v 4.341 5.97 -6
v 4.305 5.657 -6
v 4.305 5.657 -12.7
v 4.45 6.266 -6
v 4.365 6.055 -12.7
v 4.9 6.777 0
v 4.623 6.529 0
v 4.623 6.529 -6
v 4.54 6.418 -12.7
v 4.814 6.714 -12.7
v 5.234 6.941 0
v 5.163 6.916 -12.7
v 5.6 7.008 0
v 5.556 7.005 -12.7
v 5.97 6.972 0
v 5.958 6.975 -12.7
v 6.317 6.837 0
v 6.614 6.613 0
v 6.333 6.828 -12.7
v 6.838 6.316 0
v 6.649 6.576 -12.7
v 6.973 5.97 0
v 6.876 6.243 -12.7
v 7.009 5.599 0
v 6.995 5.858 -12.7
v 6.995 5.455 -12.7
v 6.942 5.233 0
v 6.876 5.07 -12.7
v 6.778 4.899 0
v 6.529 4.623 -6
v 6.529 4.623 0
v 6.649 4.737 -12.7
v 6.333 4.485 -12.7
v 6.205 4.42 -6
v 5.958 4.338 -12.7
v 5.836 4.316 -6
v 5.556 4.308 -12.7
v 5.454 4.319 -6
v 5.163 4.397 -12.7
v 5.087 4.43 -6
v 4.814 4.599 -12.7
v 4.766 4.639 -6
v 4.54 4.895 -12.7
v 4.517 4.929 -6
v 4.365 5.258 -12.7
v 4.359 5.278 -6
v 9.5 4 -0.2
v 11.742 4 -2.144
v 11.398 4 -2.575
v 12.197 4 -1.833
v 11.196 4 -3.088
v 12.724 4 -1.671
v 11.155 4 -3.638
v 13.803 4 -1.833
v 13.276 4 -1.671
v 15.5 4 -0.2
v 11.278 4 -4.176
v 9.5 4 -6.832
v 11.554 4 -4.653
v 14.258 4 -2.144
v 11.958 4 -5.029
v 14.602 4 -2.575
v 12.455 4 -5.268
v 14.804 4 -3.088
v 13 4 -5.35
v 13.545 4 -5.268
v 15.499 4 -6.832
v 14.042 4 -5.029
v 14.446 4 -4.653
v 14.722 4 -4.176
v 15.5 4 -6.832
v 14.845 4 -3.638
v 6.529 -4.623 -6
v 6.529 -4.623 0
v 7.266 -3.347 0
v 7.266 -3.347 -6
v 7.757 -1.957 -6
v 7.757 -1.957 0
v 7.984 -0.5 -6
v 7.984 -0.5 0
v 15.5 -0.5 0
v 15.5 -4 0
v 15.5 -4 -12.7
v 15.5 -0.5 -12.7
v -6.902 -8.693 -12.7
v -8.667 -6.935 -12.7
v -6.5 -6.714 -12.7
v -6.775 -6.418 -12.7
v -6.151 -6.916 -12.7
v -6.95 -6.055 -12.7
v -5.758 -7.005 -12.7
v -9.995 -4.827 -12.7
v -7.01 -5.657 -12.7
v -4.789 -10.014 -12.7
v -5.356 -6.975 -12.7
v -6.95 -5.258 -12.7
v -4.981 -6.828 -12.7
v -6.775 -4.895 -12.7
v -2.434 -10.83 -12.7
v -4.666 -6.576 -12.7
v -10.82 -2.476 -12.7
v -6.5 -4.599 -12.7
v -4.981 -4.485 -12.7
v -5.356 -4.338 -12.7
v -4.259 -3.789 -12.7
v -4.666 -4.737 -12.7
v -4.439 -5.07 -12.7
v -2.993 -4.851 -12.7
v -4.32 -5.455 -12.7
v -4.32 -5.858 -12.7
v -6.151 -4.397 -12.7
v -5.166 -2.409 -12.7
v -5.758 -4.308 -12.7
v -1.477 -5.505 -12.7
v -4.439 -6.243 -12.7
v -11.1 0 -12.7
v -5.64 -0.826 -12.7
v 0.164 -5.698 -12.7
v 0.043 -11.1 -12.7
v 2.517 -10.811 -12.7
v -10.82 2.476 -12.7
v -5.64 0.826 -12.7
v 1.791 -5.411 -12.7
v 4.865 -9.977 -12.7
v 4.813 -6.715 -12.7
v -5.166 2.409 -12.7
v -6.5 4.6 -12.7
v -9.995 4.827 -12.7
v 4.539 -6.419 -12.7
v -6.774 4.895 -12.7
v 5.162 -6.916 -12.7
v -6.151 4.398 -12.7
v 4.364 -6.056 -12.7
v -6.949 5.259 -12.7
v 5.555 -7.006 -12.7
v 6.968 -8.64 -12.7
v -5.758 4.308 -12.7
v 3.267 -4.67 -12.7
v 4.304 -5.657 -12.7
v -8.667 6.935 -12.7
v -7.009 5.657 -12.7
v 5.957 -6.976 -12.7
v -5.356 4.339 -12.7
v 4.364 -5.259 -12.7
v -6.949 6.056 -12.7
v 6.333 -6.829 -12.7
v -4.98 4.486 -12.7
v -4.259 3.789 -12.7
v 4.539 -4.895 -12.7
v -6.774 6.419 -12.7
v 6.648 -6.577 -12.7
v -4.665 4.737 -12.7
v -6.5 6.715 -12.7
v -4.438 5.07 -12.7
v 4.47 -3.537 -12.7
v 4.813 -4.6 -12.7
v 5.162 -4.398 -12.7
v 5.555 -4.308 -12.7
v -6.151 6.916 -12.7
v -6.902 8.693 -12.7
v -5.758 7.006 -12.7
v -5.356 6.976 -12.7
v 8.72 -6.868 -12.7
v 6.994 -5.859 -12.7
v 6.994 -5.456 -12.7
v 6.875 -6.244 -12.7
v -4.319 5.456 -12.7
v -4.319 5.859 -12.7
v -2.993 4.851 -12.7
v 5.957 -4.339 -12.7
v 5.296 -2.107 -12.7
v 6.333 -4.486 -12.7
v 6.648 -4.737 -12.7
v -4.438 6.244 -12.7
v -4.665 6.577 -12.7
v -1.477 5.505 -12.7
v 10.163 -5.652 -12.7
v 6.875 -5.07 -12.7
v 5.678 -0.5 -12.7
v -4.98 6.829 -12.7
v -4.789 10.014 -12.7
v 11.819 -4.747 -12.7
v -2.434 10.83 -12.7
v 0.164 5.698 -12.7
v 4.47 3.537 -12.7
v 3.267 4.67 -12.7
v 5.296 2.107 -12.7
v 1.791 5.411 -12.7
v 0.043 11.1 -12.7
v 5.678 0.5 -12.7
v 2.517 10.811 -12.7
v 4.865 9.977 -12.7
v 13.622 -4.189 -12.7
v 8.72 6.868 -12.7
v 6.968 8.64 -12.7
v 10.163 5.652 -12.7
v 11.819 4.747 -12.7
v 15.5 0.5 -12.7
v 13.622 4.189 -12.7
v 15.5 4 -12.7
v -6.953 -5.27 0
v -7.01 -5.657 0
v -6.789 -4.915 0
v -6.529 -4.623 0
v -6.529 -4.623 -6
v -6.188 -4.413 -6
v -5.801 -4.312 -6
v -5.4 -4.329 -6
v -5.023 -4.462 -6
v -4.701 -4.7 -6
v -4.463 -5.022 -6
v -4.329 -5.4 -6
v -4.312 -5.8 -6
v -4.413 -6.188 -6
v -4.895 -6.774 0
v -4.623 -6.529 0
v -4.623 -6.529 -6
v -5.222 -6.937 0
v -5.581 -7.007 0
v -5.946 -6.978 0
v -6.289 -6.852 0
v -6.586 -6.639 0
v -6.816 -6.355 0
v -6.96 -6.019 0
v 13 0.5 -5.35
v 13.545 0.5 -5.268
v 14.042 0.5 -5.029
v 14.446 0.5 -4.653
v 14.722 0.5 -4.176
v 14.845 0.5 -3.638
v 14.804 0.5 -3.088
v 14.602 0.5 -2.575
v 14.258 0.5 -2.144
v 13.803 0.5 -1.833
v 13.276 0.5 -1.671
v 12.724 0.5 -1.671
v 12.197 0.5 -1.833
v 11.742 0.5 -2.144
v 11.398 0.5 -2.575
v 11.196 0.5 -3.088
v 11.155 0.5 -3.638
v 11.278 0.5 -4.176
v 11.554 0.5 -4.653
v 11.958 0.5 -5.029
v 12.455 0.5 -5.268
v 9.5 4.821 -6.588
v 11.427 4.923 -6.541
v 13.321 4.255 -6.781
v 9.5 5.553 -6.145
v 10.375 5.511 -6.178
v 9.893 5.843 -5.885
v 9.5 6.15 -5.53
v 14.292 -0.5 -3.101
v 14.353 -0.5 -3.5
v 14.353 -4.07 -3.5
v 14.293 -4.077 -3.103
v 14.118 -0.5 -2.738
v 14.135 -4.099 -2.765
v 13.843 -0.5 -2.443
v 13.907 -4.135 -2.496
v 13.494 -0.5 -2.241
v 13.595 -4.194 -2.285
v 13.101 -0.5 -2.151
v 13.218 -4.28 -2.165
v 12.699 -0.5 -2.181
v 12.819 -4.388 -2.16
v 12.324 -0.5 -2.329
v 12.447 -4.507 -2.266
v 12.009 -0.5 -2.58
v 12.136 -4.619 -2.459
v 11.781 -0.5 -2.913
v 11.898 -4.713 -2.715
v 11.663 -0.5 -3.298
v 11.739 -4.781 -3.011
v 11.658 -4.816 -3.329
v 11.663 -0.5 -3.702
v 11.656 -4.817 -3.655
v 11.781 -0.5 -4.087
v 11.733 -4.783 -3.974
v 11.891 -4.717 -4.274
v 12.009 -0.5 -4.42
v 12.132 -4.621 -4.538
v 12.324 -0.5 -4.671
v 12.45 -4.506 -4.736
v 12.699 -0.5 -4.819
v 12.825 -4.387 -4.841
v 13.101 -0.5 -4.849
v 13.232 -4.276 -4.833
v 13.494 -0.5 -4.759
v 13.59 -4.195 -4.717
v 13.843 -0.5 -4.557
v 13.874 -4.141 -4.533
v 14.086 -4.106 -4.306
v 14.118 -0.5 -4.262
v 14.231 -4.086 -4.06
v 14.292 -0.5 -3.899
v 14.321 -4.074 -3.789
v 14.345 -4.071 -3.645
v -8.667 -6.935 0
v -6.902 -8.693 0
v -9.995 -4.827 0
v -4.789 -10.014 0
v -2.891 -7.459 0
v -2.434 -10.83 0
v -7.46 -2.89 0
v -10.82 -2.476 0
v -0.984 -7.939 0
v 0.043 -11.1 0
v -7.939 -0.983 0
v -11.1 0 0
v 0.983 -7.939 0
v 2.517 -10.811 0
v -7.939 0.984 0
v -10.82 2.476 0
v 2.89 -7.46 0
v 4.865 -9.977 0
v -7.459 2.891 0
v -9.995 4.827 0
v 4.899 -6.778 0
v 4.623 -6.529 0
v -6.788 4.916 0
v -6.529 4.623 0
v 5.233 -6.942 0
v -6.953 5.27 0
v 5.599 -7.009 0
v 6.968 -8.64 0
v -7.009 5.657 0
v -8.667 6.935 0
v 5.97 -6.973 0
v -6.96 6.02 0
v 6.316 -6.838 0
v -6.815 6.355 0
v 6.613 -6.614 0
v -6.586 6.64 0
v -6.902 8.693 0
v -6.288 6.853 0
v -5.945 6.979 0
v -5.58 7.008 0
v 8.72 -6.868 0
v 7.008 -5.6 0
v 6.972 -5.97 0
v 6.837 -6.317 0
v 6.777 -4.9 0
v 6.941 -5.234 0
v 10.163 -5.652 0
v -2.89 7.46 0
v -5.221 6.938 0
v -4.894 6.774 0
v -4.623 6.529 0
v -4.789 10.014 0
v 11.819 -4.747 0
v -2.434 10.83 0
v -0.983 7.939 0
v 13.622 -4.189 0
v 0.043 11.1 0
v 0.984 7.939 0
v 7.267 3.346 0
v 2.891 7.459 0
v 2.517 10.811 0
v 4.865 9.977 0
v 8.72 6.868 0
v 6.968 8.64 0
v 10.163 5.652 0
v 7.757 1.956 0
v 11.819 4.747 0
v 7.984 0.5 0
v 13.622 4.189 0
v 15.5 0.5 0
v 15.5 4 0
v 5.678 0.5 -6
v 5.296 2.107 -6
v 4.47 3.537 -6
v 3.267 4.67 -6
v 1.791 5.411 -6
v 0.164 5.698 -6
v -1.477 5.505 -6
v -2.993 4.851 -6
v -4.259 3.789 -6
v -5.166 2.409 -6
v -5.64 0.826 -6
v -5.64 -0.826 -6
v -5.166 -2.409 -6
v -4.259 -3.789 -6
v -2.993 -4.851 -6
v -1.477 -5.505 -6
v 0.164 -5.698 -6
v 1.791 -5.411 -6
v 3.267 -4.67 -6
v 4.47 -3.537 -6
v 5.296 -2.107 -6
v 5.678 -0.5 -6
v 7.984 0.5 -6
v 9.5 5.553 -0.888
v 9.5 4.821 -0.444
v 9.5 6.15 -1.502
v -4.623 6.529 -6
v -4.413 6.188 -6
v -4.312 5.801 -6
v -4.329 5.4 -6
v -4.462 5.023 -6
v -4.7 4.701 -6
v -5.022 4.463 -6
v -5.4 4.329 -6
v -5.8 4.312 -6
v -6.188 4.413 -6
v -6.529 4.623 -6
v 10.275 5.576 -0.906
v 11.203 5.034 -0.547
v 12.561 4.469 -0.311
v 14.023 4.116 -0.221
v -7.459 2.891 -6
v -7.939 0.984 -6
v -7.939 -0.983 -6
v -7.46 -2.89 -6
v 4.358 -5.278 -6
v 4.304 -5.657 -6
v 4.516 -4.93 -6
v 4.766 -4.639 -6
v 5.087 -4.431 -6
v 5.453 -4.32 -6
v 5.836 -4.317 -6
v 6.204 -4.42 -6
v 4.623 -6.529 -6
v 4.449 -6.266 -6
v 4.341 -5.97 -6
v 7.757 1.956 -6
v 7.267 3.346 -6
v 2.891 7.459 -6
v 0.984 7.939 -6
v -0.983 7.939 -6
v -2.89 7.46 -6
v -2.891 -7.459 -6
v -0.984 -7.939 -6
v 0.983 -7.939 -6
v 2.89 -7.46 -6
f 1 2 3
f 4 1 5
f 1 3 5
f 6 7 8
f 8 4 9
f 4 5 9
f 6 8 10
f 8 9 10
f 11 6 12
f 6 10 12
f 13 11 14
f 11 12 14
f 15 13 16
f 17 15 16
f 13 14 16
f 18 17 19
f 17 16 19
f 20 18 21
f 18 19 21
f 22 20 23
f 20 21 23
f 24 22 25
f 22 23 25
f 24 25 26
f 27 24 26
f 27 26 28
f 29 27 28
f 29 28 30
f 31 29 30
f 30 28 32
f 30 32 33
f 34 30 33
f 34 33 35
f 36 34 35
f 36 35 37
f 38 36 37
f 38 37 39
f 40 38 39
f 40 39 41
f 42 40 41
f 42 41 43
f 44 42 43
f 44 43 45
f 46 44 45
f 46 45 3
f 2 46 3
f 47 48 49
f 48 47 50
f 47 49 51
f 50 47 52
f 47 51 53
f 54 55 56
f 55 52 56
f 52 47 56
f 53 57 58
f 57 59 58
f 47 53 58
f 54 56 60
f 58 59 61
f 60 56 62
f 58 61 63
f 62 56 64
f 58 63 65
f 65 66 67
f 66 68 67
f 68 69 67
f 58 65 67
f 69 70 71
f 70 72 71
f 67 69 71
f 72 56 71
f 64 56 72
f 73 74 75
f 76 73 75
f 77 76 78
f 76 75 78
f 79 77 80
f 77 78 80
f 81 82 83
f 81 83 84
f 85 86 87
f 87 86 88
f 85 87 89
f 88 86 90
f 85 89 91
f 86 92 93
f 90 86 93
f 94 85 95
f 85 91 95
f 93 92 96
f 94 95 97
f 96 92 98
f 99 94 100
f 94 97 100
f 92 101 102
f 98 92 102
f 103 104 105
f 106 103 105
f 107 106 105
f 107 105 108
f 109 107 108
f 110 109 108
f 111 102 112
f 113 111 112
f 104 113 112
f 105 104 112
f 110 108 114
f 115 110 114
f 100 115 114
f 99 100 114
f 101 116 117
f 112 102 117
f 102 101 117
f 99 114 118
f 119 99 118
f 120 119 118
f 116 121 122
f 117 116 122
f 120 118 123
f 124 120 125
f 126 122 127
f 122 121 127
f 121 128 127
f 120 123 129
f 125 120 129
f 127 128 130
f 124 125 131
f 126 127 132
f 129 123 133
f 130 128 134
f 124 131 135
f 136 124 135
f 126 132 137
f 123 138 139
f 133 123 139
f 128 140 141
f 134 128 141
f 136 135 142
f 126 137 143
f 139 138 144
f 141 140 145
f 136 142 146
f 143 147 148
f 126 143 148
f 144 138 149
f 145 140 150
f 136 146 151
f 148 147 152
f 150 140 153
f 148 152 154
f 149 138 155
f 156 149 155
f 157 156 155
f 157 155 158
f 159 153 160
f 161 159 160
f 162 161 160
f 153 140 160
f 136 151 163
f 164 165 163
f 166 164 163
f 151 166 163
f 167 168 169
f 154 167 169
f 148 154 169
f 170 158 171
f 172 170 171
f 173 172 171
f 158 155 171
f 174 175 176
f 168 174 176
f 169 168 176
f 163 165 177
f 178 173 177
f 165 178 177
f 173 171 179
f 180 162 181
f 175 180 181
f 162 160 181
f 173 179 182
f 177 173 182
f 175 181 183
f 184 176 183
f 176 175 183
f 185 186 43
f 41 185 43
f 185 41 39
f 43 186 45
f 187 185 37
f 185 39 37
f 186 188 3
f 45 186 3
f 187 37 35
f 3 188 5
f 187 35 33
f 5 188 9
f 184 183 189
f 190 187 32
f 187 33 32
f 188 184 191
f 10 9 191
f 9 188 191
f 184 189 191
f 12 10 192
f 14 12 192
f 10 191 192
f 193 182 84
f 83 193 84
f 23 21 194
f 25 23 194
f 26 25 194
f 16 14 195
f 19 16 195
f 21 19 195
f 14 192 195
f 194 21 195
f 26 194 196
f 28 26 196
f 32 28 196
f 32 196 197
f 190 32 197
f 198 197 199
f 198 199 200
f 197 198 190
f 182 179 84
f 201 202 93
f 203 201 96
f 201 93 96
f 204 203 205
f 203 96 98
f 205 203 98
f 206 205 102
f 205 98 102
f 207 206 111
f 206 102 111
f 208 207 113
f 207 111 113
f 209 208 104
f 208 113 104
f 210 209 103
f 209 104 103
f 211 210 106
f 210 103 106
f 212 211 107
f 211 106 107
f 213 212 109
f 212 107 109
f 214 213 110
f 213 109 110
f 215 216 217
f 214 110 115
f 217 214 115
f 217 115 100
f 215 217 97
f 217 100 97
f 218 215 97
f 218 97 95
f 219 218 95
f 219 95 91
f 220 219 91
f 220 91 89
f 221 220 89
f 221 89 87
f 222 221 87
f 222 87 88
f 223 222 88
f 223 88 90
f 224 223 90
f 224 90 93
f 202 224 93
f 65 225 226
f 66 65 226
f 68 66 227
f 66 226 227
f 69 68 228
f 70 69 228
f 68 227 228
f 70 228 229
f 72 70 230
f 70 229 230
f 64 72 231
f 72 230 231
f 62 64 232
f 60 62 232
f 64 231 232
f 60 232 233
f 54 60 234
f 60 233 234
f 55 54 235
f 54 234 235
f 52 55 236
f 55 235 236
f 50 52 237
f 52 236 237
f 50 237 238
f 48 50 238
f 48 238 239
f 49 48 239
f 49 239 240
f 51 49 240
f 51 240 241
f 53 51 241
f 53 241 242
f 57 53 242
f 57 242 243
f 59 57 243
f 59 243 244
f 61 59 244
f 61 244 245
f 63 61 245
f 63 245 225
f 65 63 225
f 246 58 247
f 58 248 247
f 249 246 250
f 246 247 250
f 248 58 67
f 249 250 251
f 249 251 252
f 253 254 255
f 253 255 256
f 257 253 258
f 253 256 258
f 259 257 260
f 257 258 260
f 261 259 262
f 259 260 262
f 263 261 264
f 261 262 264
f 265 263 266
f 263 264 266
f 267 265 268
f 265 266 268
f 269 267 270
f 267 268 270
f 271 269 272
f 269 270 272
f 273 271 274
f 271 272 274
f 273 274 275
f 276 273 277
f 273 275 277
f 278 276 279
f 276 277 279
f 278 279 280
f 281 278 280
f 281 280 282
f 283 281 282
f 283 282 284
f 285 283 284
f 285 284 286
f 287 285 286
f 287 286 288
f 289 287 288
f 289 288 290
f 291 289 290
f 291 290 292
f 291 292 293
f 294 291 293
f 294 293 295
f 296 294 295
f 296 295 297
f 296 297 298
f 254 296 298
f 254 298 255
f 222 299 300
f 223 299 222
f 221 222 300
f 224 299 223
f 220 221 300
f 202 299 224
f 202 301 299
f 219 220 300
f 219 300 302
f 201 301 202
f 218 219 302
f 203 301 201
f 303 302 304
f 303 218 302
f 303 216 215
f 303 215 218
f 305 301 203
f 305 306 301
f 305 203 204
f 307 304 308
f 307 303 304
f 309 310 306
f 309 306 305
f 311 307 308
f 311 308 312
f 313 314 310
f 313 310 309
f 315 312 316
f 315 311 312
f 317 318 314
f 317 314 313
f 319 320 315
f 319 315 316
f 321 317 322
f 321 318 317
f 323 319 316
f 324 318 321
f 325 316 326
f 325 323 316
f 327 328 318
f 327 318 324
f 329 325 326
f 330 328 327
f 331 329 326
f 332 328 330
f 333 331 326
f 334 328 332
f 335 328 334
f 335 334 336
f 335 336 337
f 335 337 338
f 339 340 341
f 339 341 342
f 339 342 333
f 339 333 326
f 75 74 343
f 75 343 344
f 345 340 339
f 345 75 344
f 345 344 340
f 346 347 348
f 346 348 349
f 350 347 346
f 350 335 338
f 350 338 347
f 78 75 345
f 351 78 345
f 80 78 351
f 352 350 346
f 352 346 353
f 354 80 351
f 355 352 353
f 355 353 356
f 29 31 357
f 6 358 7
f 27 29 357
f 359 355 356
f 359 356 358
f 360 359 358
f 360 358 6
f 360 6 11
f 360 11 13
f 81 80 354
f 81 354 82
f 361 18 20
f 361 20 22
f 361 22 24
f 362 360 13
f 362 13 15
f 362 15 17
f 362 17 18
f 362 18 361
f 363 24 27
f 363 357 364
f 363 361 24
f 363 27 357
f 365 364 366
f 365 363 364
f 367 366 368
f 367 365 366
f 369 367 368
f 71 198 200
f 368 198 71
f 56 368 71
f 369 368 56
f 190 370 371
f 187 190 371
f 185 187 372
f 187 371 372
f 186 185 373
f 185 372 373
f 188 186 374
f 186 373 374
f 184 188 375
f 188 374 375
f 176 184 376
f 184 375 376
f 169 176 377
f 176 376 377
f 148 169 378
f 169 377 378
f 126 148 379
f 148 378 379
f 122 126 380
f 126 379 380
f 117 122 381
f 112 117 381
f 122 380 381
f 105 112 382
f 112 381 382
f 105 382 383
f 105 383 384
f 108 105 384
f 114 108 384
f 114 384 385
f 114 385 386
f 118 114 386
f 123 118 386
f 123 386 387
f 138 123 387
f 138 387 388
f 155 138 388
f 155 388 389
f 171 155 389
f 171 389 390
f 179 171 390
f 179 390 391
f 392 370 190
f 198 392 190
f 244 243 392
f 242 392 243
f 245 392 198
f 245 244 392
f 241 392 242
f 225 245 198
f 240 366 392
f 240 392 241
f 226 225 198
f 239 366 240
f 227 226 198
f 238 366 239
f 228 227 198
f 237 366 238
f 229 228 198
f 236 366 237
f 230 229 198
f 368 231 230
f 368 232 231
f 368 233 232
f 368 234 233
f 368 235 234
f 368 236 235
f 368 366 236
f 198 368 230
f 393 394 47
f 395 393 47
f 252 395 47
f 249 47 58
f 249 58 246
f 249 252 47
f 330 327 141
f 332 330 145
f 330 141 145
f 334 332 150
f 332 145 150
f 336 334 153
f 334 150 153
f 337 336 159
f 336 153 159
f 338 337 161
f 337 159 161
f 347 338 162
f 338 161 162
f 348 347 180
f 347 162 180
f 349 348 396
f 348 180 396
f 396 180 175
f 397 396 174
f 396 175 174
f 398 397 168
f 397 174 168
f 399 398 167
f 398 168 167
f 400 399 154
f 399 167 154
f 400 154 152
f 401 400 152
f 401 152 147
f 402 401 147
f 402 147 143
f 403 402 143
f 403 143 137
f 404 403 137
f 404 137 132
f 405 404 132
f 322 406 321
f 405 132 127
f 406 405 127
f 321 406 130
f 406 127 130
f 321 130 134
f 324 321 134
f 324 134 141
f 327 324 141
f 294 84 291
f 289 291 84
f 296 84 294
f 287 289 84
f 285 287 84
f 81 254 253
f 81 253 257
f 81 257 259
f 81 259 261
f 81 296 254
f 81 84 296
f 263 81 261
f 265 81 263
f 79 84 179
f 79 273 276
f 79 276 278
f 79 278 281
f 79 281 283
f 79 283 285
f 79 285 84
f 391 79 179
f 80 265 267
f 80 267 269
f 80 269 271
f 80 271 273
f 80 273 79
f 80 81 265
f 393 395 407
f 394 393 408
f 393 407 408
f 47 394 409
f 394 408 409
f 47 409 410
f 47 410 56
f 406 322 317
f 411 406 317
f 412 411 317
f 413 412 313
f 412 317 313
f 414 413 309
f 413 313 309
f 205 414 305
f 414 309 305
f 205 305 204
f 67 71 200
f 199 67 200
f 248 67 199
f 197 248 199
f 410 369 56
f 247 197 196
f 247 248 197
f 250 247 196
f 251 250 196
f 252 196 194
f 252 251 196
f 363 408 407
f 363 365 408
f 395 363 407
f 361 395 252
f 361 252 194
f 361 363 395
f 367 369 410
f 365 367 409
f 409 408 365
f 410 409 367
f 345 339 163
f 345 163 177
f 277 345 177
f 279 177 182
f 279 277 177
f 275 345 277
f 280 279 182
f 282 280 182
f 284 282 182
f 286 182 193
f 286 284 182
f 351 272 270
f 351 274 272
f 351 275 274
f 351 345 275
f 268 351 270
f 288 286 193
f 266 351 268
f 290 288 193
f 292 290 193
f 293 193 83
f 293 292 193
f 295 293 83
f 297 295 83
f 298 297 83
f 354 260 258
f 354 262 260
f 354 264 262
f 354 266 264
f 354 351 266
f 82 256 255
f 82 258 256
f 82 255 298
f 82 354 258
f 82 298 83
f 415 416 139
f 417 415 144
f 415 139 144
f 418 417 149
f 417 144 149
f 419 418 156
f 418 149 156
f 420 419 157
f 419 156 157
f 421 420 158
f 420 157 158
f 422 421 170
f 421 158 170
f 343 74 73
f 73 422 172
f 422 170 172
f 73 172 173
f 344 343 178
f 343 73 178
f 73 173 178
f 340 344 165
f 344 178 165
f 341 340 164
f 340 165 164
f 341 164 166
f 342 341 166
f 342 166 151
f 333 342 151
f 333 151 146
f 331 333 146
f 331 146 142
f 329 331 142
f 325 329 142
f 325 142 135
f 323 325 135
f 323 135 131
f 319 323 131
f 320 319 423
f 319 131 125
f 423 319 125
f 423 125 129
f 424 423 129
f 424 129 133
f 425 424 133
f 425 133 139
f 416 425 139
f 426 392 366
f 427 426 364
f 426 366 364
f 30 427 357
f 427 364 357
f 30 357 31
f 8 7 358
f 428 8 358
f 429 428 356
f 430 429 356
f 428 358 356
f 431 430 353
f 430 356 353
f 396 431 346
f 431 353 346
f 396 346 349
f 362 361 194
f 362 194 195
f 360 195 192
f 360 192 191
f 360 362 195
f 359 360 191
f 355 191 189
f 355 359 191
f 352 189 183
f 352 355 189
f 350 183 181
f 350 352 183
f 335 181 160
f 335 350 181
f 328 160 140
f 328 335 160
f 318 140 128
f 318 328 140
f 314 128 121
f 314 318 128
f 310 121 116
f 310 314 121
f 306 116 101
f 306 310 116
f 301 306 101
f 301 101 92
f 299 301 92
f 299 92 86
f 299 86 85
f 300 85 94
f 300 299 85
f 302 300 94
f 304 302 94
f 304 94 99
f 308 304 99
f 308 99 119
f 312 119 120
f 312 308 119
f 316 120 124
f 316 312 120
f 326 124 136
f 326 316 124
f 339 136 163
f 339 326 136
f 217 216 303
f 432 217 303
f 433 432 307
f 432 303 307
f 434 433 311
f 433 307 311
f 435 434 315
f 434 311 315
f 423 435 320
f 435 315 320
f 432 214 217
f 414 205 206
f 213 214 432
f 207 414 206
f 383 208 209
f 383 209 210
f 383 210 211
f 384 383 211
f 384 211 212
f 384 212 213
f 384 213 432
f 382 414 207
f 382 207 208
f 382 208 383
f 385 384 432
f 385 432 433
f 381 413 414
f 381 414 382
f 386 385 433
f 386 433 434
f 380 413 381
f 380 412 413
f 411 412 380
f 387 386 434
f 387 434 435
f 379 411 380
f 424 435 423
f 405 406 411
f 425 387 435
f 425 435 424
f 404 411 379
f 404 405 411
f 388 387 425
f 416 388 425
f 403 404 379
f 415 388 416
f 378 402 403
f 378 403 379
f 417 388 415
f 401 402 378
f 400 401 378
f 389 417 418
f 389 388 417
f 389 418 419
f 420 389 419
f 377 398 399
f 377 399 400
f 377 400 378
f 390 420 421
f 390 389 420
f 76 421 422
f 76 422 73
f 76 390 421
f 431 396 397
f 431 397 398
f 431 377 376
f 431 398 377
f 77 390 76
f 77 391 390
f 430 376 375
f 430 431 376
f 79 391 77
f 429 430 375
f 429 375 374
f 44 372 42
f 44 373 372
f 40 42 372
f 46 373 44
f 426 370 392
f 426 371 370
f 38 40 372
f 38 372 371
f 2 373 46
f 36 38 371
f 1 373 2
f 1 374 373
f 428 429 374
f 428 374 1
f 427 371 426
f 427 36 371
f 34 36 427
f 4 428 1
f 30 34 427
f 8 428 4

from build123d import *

# Parameters (mm, degrees)
EXTRUDE1_DEPTH            = 12.7
F_6_32_TAPPED_HOLE3_D     = 2.7051
SKETCH14_R                = 1.85
CUT_EXTRUDE6_DEPTH        = 24.153833376
F_6_32_TAPPED_HOLE5_D     = 2.7051
F_6_32_TAPPED_HOLE5_DEPTH = 50.8
F_6_32_TAPPED_HOLE5_TIP   = 0.81269403
CUT_EXTRUDE26_DEPTH       = 6
SKETCH25_R                = 5.7
CUT_EXTRUDE27_DEPTH       = 23.907422501
SKETCH26_R                = 8
CUT_EXTRUDE28_DEPTH       = 6


with BuildPart() as part:
    # Sketch1 → Extrude1 (new body)
    with BuildSketch(Plane.XY):
        with BuildLine():
            Line((0, 0), (0, 0.5))
            Line((0, 0.5), (15.5, 0.5))
            Line((15.5, 0.5), (15.5, 4))
            ThreePointArc((15.5, 4), (11.819050527, 4.746581358), (8.719864541, 6.868330393))
            ThreePointArc((8.719864541, 6.868330393), (-11.1, 0), (8.719864541, -6.868330393))
            ThreePointArc((8.719864541, -6.868330393), (11.819050527, -4.746581358), (15.5, -4))
            Line((15.5, -4), (15.5, -0.5))
            Line((15.5, -0.5), (0, -0.5))
            Line((0, -0.5), (0, 0))
        make_face()
    extrude(amount=-EXTRUDE1_DEPTH)

    # #6-32 Tapped Hole3 (through all)
    with Locations(Plane(origin=(-5.656516225, 5.657192254, 0), x_dir=(1, 0, 0), z_dir=(0, 0, 1))):
        with Locations((0, 0), (11.313708479, -0.000676029), (11.31303245, -11.314384508), (-0.000676029, -11.313708479)):
            Hole(F_6_32_TAPPED_HOLE3_D / 2)

    # Sketch14 → Cut-Extrude6 (cut, through all)
    with BuildSketch(Plane.XZ.offset(-0.5)):
        with Locations(Location((13, -3.5, 0), (0, 0, 270))):
            Circle(SKETCH14_R)
    extrude(amount=-CUT_EXTRUDE6_DEPTH, mode=Mode.SUBTRACT)

    # #6-32 Tapped Hole5
    with Locations(Plane(origin=(0, -0.5, 0), x_dir=(-1, 0, 0), z_dir=(0, 1, 0))):
        with Locations((-13, -3.5)):
            Hole(F_6_32_TAPPED_HOLE5_D / 2, depth=F_6_32_TAPPED_HOLE5_DEPTH)
            with Locations((0, 0, -(F_6_32_TAPPED_HOLE5_DEPTH + F_6_32_TAPPED_HOLE5_TIP / 2))):  # 118° drill point
                Cone(0, F_6_32_TAPPED_HOLE5_D / 2, F_6_32_TAPPED_HOLE5_TIP, mode=Mode.SUBTRACT)

    # Sketch24 → Cut-Extrude26 (cut)
    with BuildSketch(Plane(origin=(15.5, 0, 0), x_dir=(0, 0, -1), z_dir=(1, 0, 0))):
        with BuildLine():
            Line((0.2, 4), (6.832300833, 4))
            ThreePointArc((6.832300833, 4), (3.516150417, 6.820400286), (0.2, 4))
        make_face()
    extrude(amount=-CUT_EXTRUDE26_DEPTH, mode=Mode.SUBTRACT)

    # Sketch25 → Cut-Extrude27 (cut, through all)
    with BuildSketch(Plane.XY):
        Circle(SKETCH25_R)
    extrude(amount=-CUT_EXTRUDE27_DEPTH, mode=Mode.SUBTRACT)

    # Sketch26 → Cut-Extrude28 (cut)
    with BuildSketch(Plane.XY):
        Circle(SKETCH26_R)
    extrude(amount=-CUT_EXTRUDE28_DEPTH, mode=Mode.SUBTRACT)


solid = part.part
